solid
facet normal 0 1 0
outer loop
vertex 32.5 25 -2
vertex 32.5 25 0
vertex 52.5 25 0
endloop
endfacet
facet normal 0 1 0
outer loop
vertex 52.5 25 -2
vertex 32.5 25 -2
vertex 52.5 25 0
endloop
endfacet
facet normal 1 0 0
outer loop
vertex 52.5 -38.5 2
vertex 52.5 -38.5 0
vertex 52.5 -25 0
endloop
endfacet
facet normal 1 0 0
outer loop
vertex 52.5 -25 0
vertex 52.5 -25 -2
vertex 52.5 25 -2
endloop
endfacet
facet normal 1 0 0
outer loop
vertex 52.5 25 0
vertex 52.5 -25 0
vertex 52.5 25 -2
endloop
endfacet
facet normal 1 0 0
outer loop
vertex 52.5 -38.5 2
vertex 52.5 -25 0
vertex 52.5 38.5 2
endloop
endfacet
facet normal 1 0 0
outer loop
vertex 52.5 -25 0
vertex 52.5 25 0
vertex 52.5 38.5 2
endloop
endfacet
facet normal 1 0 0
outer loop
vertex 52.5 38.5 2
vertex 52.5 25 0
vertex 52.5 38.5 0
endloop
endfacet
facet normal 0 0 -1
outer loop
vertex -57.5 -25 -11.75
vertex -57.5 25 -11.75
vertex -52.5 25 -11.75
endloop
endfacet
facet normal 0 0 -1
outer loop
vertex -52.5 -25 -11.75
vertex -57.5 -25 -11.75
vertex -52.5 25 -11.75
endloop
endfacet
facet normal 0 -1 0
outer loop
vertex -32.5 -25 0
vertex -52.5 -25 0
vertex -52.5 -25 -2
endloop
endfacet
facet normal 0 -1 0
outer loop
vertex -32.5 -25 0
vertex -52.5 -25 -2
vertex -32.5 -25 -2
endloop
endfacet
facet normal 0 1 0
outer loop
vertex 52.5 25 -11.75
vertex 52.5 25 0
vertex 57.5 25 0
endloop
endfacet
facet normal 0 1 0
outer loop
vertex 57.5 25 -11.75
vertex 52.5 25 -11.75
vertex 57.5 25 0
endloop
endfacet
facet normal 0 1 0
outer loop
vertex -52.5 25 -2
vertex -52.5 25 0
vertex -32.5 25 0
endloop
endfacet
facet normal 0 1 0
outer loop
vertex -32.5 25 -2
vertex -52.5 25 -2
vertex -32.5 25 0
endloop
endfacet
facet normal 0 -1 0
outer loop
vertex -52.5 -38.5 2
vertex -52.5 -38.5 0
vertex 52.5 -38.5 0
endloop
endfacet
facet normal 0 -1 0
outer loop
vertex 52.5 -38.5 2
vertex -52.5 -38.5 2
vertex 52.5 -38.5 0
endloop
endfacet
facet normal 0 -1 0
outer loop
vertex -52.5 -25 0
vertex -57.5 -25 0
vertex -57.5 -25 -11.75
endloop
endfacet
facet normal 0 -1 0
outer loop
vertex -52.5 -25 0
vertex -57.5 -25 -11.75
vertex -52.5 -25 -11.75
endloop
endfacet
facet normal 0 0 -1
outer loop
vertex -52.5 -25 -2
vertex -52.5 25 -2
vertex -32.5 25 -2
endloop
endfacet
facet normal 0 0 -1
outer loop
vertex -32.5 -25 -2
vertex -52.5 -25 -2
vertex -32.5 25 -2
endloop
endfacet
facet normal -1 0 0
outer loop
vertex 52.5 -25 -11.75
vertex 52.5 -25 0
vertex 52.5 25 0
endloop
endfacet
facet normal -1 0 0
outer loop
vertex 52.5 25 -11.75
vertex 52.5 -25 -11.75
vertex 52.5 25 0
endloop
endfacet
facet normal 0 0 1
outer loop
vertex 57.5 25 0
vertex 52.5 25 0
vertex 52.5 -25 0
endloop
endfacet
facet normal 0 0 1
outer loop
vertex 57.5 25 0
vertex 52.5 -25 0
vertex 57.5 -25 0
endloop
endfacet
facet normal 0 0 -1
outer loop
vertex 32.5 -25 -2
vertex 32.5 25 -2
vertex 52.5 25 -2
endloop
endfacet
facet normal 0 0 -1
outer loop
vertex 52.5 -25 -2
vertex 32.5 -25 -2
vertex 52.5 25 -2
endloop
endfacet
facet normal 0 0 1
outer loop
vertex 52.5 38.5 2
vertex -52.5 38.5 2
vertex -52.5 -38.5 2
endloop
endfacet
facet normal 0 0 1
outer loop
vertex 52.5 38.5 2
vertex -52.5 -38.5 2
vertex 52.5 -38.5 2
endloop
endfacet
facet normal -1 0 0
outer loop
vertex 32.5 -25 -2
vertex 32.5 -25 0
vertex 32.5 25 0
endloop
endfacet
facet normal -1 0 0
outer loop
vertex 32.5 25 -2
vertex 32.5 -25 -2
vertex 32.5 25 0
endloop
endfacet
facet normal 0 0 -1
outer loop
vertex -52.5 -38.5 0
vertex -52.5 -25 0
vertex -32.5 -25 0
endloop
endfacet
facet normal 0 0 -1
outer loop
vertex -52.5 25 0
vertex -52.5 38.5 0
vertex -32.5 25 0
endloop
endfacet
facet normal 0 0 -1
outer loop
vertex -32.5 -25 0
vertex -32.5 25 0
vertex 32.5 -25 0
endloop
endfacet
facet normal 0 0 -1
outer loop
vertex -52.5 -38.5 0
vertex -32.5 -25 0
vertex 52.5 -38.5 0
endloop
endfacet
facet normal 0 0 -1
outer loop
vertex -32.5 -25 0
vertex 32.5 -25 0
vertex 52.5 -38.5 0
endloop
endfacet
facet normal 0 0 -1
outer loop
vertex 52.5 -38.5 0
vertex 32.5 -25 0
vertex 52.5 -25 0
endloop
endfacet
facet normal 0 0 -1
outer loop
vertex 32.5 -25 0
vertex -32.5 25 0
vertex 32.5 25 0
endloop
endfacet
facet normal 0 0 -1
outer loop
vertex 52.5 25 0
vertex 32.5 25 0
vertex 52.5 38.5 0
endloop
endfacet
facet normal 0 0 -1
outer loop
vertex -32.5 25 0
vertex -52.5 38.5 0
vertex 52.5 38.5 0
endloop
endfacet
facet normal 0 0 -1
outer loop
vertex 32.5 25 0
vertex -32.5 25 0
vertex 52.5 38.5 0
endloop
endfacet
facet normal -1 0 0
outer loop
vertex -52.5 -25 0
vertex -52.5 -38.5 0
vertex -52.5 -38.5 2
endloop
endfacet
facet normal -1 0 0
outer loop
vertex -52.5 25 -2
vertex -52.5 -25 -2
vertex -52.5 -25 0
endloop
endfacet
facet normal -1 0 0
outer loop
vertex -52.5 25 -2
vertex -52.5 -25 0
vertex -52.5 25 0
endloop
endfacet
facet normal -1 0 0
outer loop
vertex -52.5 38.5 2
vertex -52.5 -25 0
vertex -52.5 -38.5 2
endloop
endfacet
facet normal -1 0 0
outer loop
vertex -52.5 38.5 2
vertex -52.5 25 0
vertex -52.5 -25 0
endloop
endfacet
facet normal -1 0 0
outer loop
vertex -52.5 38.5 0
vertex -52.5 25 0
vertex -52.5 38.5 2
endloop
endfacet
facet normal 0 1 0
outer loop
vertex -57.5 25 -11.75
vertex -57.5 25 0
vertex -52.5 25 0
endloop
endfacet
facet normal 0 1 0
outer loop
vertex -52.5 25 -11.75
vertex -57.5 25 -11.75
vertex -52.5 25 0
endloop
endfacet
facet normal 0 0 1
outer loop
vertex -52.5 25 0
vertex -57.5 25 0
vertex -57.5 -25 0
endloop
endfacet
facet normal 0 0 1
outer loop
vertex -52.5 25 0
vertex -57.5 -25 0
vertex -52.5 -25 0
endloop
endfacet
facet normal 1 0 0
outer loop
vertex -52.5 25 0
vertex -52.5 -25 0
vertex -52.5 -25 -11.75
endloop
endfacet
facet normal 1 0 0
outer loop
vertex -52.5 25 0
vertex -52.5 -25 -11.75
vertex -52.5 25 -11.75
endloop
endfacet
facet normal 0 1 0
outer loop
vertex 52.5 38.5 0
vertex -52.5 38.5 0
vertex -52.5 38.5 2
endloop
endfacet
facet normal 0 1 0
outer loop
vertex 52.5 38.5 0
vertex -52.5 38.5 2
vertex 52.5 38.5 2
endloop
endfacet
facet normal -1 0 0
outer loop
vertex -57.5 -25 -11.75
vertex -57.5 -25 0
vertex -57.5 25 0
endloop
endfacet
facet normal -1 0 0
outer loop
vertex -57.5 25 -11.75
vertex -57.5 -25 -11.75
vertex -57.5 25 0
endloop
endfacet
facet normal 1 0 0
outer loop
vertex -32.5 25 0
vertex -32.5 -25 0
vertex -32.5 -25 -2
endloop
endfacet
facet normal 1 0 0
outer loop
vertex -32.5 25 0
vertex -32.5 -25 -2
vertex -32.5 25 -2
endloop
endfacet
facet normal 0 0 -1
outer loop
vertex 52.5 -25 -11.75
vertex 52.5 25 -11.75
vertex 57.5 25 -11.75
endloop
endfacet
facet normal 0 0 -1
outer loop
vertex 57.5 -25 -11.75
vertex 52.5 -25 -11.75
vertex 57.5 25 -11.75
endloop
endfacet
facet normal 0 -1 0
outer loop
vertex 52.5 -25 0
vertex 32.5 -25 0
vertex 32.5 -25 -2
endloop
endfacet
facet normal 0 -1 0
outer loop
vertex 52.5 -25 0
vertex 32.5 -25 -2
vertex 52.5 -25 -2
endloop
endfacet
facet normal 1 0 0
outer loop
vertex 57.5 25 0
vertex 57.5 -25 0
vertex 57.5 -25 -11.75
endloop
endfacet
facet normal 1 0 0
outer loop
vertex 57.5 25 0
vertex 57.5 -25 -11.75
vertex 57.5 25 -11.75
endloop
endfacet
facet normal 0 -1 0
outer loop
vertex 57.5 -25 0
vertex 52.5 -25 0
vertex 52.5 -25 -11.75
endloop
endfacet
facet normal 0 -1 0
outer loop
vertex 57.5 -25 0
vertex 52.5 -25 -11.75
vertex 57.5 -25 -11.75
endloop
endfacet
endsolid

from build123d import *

# Parameters (mm, degrees)
F0_W     = 105
F0_H     = 77
F0_W_2   = 5
F0_H_2   = 50
F2_DEPTH = 2
F1_W     = 5
F1_H     = 50
F3_DEPTH = 11.75
F1_W_2   = 20
F1_W_3   = 8.9916351438
F1_W_4   = 6.0083648562
F4_DEPTH = 2


with BuildPart() as f2:
    # F0 (on Top) → F2 (new body)
    with BuildSketch(Plane.XY):
        Rectangle(F0_W, F0_H)
        with Locations((43.9916351438, 0)):
            Rectangle(F0_W_2, F0_H_2, mode=Mode.SUBTRACT)
        with Locations((43.9916351438, 0)):
            Rectangle(F0_W_2, F0_H_2)
    extrude(amount=F2_DEPTH)

    # F1 (on face) + F0 (on Top) → F4 (join)
    with BuildSketch(Plane.XY):
        with Locations((-42.5, 0)):
            Rectangle(F1_W_2, F1_H)
        with Locations((36.9958175719, 0)):
            Rectangle(F1_W_3, F1_H)
        with Locations((49.4958175719, 0)):
            Rectangle(F1_W_4, F1_H)
    with BuildSketch(Plane.XY):
        with Locations((43.9916351438, 0)):
            Rectangle(F0_W_2, F0_H_2)
    extrude(amount=-F4_DEPTH)


with BuildPart() as f3:
    # F1 (on face) → F3 (new body)
    with BuildSketch(Plane.XY):
        with Locations((-55, 0)):
            Rectangle(F1_W, F1_H)
    extrude(amount=-F3_DEPTH)


with BuildPart() as f3b:
    # F1 (on face) → F3, piece 2 (new body)
    with BuildSketch(Plane.XY):
        with Locations((55, 0)):
            Rectangle(F1_W, F1_H)
    extrude(amount=-F3_DEPTH)


solid = Compound([f2.part, f3.part, f3b.part])
